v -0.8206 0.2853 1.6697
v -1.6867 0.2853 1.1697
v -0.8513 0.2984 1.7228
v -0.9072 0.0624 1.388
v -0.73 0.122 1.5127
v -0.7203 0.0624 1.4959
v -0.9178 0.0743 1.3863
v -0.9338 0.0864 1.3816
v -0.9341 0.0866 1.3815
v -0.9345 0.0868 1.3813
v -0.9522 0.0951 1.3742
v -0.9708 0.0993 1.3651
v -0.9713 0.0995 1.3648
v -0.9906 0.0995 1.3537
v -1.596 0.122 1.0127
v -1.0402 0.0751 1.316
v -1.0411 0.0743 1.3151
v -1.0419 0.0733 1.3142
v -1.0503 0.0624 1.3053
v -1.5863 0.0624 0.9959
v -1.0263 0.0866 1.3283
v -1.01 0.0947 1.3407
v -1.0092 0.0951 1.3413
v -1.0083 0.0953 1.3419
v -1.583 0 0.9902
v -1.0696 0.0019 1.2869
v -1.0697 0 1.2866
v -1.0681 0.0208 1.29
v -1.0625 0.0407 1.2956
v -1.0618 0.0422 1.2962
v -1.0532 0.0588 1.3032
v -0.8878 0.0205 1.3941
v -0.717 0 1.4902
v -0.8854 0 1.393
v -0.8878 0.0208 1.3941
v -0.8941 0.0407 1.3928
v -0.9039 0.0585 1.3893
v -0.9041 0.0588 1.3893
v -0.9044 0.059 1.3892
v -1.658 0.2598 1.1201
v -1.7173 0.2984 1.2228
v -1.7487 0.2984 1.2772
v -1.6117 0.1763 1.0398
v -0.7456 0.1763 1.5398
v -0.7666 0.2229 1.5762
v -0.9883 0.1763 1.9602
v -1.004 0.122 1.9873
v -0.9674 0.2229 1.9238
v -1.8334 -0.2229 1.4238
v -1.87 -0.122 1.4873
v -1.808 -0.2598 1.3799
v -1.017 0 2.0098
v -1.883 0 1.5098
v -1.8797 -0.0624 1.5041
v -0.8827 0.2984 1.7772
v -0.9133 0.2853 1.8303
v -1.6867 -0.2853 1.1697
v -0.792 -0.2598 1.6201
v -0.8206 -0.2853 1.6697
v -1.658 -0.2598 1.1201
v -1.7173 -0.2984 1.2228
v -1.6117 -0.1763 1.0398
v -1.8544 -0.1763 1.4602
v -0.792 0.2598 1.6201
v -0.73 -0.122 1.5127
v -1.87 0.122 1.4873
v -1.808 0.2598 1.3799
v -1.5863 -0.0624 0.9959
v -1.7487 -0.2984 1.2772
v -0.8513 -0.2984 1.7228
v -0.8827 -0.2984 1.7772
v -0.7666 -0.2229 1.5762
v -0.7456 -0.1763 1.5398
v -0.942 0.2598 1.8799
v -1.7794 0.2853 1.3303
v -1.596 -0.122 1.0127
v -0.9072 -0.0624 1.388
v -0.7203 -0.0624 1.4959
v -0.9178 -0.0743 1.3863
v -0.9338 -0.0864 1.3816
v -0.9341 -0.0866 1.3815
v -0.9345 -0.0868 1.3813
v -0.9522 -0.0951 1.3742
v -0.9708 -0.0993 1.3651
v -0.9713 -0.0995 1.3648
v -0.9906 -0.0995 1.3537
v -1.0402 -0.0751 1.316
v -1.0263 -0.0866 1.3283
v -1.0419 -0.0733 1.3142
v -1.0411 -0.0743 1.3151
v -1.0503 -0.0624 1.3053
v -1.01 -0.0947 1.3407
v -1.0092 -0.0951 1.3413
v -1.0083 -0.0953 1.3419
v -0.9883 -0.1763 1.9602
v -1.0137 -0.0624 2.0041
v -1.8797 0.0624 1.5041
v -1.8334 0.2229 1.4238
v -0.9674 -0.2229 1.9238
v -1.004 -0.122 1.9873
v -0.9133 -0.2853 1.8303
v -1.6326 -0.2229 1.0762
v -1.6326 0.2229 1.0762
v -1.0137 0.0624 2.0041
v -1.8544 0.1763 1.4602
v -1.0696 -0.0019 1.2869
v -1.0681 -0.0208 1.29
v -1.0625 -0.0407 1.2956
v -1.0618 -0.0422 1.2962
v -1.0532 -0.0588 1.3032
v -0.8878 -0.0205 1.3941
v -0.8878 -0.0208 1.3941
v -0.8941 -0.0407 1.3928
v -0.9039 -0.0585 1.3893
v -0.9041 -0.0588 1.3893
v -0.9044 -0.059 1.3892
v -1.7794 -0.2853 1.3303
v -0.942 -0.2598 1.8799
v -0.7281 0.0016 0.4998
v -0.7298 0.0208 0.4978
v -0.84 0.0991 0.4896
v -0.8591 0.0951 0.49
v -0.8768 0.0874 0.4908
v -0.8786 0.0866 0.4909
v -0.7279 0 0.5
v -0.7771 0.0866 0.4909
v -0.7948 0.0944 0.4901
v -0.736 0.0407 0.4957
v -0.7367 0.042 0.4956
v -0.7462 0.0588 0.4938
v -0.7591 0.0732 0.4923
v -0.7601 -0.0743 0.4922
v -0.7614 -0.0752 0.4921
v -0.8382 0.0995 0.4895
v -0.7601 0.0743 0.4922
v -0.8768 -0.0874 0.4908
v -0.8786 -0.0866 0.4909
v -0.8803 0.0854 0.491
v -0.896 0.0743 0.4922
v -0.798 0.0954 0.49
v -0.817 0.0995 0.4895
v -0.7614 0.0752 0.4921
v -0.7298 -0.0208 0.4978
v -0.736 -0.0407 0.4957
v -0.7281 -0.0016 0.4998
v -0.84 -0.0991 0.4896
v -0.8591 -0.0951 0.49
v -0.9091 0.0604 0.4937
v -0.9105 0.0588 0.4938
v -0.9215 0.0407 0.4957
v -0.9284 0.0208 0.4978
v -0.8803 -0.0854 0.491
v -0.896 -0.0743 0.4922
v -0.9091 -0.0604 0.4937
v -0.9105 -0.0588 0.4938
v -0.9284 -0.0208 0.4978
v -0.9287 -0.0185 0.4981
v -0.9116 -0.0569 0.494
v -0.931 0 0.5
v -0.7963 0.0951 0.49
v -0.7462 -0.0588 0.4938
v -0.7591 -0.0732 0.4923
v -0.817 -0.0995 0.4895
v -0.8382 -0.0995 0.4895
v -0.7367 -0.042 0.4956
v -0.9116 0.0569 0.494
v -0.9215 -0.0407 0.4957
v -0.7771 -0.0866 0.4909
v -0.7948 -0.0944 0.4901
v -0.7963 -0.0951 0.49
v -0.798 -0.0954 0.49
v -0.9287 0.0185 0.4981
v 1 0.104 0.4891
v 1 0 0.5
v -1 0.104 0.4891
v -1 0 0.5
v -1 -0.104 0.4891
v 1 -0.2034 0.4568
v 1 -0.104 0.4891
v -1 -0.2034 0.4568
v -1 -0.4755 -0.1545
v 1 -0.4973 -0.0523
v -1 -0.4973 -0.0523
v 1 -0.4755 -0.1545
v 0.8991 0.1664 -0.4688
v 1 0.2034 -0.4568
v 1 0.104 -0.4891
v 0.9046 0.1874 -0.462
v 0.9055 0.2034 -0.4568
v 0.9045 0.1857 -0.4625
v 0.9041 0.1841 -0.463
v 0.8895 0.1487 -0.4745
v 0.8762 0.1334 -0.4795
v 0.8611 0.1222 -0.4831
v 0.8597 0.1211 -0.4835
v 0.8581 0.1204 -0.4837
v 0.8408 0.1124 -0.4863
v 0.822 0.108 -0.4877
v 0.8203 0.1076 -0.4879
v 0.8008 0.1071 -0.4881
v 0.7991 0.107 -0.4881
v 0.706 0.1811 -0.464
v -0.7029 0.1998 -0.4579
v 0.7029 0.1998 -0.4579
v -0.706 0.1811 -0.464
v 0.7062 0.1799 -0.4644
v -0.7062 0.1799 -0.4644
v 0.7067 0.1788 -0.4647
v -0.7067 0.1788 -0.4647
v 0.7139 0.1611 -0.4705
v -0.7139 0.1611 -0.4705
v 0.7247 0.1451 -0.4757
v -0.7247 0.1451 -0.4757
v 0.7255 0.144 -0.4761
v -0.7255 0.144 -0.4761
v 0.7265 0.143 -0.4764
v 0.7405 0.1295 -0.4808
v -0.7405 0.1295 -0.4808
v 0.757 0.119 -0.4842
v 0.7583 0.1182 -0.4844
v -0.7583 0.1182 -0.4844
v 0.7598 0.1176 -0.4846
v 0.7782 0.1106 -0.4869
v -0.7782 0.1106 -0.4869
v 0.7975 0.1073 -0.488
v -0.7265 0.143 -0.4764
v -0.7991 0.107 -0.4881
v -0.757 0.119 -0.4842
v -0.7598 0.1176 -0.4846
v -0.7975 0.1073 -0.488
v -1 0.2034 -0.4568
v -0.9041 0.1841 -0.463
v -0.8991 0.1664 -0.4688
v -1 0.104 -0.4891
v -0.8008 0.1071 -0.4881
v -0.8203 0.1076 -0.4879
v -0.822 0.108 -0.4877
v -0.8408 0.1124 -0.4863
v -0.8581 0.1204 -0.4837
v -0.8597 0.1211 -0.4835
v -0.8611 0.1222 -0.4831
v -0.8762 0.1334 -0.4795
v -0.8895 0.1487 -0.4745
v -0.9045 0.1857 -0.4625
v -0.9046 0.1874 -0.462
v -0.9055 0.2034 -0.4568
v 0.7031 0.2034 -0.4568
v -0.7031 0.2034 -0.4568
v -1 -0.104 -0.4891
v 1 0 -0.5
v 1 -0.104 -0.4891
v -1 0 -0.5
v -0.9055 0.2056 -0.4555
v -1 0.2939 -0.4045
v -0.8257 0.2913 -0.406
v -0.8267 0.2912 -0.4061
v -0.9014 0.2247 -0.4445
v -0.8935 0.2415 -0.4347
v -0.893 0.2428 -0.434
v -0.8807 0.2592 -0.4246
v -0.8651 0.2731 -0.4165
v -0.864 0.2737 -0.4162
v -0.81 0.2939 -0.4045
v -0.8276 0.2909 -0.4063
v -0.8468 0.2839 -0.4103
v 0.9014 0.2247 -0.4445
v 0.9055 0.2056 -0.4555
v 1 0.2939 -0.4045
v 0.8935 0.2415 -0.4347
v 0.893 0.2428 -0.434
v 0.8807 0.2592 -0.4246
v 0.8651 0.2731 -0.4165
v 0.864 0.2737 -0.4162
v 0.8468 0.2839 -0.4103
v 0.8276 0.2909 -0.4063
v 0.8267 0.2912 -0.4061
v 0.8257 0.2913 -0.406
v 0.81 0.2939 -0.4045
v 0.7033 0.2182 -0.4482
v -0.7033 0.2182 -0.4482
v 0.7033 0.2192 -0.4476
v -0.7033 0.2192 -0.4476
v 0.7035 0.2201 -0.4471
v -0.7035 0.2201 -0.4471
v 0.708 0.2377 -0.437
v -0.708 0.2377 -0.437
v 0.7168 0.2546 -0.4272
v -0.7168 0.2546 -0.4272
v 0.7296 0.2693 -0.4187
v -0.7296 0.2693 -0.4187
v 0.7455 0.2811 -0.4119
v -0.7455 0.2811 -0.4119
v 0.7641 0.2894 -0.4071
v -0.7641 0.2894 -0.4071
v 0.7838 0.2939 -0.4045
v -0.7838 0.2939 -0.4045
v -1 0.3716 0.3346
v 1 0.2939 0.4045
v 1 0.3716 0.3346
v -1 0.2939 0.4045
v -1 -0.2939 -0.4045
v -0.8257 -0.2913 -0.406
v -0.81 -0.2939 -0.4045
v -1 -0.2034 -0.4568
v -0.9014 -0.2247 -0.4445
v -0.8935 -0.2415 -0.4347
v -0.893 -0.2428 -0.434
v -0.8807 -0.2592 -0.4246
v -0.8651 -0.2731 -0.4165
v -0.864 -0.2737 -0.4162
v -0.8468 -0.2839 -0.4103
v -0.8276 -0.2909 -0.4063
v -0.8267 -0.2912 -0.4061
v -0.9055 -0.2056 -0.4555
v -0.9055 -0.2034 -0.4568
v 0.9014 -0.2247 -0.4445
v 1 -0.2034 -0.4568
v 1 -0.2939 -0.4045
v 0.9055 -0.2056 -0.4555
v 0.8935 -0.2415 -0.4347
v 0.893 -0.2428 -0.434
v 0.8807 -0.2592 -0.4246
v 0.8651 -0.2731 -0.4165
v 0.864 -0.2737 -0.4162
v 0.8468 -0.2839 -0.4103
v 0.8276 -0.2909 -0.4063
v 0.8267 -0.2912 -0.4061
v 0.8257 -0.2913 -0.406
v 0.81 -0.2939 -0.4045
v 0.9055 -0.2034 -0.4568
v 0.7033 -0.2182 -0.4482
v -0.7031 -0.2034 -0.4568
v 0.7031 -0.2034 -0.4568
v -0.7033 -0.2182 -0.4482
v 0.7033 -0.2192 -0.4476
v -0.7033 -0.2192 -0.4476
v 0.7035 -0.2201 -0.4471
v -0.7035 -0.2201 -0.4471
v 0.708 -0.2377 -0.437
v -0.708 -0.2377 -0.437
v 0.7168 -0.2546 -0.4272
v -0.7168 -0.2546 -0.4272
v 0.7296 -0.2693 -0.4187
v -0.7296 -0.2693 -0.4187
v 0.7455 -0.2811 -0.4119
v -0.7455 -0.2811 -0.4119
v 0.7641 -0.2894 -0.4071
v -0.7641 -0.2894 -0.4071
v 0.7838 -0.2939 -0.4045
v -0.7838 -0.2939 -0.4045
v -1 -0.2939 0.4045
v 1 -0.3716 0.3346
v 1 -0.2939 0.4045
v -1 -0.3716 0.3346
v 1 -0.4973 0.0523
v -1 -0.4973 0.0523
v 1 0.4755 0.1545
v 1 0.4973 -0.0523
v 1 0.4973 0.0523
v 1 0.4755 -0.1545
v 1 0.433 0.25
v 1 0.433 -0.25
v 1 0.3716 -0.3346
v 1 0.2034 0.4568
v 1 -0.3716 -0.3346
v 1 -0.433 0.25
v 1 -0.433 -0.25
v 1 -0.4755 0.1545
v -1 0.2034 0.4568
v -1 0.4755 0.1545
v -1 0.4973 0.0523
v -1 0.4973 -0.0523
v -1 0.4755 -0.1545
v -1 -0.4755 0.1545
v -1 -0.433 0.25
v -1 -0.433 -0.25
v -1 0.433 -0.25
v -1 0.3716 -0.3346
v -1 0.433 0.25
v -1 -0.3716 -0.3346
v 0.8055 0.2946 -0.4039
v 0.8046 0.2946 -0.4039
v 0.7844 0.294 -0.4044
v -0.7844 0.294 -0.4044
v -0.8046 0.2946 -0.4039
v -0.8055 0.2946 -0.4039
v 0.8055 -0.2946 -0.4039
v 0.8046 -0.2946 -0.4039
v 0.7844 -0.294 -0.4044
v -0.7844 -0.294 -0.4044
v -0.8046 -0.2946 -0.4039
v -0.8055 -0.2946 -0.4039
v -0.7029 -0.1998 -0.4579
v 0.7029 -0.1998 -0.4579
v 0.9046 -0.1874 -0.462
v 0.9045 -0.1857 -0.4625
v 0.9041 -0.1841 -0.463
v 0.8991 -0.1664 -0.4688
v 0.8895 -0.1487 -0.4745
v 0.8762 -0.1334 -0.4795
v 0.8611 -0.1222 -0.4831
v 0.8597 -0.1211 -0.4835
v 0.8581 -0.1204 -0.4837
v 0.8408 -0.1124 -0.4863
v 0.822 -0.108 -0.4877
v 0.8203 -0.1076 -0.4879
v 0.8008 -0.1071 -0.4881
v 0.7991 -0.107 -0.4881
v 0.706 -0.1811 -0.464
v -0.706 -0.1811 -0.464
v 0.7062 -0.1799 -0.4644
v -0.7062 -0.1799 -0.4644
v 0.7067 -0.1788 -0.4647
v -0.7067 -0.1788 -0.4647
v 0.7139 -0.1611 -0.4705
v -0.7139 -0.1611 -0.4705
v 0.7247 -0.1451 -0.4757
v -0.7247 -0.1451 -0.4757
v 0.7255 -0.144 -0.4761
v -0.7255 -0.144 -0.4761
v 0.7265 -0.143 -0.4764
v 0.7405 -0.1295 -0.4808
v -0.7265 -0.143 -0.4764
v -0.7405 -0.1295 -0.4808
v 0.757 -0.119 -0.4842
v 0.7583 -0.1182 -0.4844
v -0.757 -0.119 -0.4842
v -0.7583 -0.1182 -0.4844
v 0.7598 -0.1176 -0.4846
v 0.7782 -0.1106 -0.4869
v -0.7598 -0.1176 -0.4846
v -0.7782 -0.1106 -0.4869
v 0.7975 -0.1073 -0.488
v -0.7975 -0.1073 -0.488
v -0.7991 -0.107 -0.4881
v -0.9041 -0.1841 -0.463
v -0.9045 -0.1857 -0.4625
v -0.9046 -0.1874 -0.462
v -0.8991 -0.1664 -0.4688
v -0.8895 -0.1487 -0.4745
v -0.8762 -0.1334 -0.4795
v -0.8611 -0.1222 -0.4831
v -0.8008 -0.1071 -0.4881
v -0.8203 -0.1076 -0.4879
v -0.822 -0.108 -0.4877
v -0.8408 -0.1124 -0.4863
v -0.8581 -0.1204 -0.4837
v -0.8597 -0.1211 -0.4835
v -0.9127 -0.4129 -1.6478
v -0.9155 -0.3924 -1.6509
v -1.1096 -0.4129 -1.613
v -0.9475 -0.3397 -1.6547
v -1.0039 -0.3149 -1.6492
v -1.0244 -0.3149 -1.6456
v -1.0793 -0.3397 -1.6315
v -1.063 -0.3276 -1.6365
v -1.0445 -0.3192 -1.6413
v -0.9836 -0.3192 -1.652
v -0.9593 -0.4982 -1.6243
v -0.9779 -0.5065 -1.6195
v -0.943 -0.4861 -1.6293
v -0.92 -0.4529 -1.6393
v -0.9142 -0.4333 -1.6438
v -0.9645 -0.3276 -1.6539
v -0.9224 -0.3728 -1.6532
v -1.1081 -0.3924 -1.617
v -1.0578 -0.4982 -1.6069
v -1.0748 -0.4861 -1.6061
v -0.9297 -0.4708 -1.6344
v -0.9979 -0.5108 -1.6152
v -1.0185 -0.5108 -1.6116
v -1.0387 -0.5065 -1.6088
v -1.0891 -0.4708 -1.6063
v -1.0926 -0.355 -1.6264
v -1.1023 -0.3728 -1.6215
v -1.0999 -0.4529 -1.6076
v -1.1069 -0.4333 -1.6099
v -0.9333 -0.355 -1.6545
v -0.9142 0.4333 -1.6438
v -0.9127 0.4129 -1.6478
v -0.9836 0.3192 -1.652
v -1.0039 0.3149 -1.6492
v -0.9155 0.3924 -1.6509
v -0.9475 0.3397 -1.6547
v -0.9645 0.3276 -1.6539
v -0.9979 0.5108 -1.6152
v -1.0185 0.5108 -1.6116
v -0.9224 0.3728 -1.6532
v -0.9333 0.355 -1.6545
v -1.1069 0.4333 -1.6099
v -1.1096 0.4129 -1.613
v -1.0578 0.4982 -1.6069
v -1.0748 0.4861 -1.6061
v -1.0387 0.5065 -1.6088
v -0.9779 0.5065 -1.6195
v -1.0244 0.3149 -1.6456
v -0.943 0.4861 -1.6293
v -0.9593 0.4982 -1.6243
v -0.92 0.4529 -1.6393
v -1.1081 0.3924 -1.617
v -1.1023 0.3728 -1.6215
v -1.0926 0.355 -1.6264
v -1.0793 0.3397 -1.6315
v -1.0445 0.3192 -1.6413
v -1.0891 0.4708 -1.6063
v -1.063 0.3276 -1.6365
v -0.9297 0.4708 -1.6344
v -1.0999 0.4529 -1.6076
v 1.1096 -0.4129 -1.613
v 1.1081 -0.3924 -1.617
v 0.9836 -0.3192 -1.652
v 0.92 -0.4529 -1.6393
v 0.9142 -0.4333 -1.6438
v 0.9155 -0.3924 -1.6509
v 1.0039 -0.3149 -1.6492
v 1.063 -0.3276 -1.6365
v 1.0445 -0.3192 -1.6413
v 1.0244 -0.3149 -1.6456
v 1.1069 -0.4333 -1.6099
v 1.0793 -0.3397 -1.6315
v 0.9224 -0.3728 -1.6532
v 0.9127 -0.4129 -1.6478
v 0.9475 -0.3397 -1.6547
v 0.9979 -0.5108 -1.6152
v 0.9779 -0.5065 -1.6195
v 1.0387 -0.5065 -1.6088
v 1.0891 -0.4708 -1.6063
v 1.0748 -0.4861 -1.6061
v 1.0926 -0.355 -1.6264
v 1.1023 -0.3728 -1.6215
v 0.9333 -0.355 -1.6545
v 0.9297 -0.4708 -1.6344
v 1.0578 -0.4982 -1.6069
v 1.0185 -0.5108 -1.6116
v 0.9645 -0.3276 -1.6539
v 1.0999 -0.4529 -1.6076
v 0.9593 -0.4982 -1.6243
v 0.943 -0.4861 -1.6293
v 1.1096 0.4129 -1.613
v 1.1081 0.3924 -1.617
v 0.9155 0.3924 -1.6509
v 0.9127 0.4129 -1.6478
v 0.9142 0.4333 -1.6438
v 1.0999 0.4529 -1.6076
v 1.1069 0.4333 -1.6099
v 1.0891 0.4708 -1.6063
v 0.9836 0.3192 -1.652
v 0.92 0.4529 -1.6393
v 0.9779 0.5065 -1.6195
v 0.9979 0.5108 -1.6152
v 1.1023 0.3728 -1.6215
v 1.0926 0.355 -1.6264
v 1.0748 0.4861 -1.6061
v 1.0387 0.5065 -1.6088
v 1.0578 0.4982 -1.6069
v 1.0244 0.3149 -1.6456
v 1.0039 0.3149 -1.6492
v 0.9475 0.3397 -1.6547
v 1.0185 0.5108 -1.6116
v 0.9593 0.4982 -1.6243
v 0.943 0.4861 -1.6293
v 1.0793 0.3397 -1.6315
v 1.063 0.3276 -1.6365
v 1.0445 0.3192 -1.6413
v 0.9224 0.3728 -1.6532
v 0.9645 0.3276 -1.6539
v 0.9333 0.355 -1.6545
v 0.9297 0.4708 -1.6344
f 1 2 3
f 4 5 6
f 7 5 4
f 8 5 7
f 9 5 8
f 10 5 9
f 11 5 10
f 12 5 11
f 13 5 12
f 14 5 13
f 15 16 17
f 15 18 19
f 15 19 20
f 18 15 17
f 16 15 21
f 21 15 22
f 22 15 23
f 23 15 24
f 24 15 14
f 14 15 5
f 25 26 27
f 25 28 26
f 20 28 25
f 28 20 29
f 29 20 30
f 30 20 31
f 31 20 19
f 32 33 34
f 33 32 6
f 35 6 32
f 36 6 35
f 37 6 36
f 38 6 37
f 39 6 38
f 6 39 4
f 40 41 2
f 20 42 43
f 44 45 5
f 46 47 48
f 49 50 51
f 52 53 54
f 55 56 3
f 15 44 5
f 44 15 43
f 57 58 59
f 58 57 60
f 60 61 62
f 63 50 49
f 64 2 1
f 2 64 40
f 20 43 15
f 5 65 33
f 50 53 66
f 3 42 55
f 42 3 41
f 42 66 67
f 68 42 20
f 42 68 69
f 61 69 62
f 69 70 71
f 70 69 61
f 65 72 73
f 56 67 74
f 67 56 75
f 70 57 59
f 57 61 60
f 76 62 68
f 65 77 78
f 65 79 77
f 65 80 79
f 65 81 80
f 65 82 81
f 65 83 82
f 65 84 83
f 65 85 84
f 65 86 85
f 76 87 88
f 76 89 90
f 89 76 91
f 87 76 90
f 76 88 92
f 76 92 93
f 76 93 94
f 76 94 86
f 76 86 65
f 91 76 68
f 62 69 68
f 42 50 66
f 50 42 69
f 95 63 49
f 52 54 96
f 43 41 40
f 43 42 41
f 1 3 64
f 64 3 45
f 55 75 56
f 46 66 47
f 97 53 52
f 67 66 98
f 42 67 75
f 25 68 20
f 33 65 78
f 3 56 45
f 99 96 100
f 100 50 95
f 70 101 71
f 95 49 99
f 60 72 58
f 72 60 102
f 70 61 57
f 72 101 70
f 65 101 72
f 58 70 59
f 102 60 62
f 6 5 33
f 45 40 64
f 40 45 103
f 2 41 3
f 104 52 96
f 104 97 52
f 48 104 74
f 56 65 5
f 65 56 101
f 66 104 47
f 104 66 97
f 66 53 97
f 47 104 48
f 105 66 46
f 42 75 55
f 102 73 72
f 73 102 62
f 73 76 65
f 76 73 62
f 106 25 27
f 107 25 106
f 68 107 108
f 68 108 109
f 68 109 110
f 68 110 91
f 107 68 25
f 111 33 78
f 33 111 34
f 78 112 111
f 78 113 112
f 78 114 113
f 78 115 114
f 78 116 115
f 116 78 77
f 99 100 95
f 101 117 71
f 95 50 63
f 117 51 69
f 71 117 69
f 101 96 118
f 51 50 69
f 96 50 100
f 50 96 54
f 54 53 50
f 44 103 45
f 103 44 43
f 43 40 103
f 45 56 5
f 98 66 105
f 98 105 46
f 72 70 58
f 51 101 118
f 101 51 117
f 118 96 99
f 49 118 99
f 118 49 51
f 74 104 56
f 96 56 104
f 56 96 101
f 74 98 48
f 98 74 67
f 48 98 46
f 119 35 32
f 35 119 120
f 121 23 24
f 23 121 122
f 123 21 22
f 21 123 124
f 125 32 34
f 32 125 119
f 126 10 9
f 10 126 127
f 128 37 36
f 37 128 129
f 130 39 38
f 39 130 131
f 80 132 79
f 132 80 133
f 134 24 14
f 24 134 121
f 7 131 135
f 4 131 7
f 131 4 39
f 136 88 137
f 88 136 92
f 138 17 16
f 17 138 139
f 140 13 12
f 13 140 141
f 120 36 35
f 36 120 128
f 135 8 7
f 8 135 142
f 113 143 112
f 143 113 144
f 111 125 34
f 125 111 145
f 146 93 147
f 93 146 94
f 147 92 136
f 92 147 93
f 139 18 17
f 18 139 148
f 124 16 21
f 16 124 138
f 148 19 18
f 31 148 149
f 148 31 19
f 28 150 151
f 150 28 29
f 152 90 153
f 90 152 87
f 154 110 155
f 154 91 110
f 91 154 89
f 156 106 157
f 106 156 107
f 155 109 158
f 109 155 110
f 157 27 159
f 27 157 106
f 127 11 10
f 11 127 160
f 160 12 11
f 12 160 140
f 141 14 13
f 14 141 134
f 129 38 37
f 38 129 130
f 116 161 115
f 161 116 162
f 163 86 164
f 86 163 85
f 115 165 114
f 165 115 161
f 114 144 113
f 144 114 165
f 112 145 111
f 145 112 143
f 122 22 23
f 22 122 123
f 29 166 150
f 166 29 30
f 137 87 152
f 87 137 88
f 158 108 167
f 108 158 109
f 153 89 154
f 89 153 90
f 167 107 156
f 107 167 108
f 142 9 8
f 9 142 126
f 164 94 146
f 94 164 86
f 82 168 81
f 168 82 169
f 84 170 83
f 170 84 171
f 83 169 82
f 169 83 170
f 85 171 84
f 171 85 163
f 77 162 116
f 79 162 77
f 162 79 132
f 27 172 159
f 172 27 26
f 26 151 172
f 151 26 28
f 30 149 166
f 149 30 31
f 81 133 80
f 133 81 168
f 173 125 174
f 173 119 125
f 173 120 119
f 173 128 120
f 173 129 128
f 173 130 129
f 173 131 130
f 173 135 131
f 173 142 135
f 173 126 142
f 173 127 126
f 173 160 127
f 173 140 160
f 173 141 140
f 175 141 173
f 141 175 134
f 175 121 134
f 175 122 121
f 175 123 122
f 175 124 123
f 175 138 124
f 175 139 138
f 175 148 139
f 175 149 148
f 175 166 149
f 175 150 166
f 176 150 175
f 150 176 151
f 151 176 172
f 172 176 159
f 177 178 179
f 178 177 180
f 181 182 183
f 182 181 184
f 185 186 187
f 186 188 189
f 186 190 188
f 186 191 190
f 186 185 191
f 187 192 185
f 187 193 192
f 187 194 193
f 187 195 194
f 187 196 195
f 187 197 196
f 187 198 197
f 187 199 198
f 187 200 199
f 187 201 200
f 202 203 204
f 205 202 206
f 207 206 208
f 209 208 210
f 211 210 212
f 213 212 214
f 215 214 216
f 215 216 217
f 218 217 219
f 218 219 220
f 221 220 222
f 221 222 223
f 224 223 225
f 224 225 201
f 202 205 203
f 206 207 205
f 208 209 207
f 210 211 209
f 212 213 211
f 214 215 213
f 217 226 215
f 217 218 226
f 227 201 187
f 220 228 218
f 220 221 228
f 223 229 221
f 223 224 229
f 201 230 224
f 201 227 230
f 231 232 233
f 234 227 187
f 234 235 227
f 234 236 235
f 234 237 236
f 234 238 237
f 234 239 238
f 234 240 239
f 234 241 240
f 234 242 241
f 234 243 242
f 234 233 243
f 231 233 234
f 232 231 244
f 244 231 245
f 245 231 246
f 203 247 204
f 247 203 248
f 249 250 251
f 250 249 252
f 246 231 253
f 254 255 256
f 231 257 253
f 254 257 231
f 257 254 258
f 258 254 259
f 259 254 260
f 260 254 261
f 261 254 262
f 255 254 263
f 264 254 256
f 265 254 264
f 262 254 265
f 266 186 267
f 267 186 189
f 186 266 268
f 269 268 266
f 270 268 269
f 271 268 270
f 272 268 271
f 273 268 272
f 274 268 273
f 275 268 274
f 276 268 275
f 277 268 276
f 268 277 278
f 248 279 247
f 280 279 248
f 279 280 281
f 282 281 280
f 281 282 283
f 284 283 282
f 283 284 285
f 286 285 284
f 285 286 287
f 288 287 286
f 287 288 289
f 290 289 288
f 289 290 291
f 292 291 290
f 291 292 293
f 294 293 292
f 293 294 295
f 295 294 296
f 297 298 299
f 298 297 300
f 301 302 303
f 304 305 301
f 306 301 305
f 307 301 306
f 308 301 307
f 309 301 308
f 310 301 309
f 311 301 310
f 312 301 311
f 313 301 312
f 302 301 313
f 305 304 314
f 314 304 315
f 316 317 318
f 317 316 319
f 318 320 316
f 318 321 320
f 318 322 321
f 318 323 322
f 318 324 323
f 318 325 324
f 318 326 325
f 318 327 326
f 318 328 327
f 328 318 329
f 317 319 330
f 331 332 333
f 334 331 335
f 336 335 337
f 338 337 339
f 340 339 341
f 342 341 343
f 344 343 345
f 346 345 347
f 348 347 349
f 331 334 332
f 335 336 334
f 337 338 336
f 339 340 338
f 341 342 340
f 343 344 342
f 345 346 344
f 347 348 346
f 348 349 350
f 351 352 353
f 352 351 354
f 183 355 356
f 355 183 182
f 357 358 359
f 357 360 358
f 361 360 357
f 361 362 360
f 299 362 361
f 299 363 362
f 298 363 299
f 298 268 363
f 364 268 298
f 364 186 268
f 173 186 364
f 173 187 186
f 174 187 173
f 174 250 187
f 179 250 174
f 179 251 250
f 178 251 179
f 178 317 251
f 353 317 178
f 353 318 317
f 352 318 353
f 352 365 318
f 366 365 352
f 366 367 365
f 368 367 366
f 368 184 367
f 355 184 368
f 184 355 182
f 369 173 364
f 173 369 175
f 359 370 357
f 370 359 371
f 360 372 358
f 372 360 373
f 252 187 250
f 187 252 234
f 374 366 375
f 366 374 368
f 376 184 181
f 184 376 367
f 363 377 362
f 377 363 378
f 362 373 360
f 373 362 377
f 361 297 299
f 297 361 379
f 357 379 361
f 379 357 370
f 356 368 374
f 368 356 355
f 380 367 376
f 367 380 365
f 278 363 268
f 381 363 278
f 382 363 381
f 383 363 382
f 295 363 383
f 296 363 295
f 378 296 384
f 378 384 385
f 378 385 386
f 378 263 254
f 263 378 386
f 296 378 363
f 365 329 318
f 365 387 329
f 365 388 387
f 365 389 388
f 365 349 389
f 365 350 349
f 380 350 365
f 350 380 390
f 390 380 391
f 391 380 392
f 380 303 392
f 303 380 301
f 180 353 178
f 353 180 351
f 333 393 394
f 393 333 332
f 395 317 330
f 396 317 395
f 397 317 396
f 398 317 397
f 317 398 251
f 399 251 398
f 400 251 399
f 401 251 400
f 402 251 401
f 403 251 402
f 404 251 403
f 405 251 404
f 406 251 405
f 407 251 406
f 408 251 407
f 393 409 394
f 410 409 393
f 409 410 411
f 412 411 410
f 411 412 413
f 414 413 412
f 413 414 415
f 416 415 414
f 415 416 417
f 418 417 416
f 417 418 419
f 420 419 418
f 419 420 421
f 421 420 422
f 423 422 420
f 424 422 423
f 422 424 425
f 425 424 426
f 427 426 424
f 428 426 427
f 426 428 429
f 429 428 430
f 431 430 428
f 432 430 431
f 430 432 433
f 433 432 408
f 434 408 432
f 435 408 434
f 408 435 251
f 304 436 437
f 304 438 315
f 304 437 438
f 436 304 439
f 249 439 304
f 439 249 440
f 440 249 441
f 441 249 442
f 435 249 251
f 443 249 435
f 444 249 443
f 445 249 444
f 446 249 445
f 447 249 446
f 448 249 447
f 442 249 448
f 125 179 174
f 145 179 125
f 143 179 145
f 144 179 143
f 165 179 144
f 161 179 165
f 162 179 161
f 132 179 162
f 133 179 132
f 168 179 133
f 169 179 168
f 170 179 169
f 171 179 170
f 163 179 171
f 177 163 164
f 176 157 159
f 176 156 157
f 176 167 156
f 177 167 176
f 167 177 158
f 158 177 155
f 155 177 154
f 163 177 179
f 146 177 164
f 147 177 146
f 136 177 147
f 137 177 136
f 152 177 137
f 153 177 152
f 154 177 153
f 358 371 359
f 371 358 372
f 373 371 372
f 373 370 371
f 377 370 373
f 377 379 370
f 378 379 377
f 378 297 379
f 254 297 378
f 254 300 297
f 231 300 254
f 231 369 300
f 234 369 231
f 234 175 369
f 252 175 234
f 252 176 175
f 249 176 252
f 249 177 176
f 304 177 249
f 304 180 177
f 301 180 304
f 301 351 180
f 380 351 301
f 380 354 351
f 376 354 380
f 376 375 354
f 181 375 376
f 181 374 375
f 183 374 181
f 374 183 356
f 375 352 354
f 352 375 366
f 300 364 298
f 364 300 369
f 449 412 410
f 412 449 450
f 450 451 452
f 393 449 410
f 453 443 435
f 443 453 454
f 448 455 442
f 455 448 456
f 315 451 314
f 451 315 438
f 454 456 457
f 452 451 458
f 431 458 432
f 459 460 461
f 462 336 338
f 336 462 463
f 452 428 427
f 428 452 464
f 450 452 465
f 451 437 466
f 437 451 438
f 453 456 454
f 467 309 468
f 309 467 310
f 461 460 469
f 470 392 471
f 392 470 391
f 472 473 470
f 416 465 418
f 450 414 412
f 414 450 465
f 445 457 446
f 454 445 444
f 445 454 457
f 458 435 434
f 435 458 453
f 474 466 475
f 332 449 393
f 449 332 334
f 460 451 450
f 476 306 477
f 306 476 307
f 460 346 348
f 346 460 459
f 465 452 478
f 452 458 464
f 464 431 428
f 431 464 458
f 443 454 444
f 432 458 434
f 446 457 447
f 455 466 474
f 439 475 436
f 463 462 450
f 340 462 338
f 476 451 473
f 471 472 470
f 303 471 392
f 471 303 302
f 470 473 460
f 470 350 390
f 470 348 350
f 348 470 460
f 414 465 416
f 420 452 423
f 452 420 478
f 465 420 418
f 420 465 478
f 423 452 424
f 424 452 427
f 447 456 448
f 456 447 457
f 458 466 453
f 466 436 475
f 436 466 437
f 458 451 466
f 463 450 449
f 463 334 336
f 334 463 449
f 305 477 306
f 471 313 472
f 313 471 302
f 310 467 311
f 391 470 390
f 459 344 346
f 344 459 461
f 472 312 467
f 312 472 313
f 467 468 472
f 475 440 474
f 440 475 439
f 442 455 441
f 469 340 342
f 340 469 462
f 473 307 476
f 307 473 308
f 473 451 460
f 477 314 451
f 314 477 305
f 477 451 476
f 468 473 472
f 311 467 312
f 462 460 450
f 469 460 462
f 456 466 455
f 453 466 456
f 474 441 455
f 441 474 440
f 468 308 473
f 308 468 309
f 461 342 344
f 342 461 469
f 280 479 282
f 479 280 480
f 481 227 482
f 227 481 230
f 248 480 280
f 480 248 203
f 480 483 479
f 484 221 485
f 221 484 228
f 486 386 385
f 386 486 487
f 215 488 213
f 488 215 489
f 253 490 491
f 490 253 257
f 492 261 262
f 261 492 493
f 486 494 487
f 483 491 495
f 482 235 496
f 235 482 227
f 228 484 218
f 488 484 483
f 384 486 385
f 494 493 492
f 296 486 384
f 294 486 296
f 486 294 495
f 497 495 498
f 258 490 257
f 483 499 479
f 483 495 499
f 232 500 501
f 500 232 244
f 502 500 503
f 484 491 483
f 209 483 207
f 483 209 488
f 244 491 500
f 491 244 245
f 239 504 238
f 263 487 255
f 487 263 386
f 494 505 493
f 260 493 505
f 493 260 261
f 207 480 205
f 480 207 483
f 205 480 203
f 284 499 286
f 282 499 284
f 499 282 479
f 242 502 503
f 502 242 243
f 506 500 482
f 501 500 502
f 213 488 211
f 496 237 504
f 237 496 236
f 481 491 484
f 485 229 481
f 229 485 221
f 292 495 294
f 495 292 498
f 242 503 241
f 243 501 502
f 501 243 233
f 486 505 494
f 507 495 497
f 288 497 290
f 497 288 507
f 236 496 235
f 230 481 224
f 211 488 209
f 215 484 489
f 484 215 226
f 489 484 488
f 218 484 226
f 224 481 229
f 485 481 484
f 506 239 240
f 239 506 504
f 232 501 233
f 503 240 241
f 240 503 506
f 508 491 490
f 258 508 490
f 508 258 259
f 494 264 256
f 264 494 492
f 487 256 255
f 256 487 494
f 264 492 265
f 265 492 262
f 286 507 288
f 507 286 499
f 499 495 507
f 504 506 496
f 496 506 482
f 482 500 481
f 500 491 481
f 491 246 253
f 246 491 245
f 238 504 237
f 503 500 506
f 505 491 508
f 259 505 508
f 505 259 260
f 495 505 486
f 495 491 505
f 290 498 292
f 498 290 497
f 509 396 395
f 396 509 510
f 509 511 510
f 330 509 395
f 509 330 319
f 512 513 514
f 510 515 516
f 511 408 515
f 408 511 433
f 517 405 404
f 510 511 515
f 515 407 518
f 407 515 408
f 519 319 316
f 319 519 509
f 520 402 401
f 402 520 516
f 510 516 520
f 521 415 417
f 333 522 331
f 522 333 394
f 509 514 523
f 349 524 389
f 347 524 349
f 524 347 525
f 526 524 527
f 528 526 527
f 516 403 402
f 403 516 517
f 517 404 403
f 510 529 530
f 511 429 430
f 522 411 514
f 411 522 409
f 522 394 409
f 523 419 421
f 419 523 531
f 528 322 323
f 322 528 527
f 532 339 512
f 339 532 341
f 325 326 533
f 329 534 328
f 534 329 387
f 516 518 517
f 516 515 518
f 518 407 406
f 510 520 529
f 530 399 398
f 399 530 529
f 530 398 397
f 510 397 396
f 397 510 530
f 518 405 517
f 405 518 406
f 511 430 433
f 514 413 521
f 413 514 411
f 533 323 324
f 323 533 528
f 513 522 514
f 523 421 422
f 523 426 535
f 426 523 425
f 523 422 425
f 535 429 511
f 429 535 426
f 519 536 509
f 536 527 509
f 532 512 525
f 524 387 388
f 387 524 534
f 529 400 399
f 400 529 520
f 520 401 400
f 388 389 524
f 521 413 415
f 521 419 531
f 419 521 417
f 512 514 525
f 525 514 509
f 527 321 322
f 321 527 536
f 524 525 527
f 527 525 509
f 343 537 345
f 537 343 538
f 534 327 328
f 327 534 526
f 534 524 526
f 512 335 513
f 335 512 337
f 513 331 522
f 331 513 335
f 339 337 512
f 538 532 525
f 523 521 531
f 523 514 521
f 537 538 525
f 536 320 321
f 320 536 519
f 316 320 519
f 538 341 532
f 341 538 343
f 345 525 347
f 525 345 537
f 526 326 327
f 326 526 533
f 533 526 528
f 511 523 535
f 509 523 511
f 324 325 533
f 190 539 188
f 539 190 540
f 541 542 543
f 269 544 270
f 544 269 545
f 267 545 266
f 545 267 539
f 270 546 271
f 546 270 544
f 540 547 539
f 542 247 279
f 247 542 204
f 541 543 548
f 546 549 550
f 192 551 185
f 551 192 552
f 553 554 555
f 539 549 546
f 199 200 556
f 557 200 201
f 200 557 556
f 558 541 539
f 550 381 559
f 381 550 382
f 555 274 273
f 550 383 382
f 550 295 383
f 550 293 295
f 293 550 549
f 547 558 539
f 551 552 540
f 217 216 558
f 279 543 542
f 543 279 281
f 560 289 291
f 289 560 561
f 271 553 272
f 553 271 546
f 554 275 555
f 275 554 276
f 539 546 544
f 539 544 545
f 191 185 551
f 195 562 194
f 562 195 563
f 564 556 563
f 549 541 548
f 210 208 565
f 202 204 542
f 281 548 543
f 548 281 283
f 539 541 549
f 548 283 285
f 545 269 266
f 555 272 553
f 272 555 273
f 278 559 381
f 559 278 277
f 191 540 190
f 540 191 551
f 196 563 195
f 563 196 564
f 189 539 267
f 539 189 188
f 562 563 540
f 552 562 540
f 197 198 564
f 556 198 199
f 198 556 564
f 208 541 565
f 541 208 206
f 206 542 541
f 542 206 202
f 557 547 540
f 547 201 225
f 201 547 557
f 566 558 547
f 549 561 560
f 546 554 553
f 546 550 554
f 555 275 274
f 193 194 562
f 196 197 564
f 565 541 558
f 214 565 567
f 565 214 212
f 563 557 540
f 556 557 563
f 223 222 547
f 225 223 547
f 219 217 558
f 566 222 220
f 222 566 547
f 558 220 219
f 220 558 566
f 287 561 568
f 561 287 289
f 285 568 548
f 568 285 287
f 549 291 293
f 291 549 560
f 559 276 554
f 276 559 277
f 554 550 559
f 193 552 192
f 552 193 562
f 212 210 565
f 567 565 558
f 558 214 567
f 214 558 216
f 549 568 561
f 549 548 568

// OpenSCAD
	union() {
	    translate([-0.9,0,0.9]) {
		translate([-0.4,0,0.6]) rotate([0,60,0])
		    cylinder(h=1,r=0.3,center=true,$fn=30);
		rotate([0,-10,0])
		    cylinder(h=1,r=0.1,center=true,$fn=30);
	    }
	    rotate([0,90,0])
		cylinder(h=2,r=0.5,center=true,$fn=30);
	    translate([-0.9,-0.3,-1])
		rotate([-10,10,0])
		    cylinder(h=1.3,r=0.1,center=true,$fn=30);
	    translate([-0.9,0.3,-1])
		rotate([10,10,0])
		    cylinder(h=1.3,r=0.1,center=true,$fn=30);
	    translate([0.9,-0.3,-1])
		rotate([-10,-10,0])
		    cylinder(h=1.3,r=0.1,center=true,$fn=30);
	    translate([0.9,0.3,-1])
		rotate([10,-10,0])
		    cylinder(h=1.3,r=0.1,center=true,$fn=30);
	}
